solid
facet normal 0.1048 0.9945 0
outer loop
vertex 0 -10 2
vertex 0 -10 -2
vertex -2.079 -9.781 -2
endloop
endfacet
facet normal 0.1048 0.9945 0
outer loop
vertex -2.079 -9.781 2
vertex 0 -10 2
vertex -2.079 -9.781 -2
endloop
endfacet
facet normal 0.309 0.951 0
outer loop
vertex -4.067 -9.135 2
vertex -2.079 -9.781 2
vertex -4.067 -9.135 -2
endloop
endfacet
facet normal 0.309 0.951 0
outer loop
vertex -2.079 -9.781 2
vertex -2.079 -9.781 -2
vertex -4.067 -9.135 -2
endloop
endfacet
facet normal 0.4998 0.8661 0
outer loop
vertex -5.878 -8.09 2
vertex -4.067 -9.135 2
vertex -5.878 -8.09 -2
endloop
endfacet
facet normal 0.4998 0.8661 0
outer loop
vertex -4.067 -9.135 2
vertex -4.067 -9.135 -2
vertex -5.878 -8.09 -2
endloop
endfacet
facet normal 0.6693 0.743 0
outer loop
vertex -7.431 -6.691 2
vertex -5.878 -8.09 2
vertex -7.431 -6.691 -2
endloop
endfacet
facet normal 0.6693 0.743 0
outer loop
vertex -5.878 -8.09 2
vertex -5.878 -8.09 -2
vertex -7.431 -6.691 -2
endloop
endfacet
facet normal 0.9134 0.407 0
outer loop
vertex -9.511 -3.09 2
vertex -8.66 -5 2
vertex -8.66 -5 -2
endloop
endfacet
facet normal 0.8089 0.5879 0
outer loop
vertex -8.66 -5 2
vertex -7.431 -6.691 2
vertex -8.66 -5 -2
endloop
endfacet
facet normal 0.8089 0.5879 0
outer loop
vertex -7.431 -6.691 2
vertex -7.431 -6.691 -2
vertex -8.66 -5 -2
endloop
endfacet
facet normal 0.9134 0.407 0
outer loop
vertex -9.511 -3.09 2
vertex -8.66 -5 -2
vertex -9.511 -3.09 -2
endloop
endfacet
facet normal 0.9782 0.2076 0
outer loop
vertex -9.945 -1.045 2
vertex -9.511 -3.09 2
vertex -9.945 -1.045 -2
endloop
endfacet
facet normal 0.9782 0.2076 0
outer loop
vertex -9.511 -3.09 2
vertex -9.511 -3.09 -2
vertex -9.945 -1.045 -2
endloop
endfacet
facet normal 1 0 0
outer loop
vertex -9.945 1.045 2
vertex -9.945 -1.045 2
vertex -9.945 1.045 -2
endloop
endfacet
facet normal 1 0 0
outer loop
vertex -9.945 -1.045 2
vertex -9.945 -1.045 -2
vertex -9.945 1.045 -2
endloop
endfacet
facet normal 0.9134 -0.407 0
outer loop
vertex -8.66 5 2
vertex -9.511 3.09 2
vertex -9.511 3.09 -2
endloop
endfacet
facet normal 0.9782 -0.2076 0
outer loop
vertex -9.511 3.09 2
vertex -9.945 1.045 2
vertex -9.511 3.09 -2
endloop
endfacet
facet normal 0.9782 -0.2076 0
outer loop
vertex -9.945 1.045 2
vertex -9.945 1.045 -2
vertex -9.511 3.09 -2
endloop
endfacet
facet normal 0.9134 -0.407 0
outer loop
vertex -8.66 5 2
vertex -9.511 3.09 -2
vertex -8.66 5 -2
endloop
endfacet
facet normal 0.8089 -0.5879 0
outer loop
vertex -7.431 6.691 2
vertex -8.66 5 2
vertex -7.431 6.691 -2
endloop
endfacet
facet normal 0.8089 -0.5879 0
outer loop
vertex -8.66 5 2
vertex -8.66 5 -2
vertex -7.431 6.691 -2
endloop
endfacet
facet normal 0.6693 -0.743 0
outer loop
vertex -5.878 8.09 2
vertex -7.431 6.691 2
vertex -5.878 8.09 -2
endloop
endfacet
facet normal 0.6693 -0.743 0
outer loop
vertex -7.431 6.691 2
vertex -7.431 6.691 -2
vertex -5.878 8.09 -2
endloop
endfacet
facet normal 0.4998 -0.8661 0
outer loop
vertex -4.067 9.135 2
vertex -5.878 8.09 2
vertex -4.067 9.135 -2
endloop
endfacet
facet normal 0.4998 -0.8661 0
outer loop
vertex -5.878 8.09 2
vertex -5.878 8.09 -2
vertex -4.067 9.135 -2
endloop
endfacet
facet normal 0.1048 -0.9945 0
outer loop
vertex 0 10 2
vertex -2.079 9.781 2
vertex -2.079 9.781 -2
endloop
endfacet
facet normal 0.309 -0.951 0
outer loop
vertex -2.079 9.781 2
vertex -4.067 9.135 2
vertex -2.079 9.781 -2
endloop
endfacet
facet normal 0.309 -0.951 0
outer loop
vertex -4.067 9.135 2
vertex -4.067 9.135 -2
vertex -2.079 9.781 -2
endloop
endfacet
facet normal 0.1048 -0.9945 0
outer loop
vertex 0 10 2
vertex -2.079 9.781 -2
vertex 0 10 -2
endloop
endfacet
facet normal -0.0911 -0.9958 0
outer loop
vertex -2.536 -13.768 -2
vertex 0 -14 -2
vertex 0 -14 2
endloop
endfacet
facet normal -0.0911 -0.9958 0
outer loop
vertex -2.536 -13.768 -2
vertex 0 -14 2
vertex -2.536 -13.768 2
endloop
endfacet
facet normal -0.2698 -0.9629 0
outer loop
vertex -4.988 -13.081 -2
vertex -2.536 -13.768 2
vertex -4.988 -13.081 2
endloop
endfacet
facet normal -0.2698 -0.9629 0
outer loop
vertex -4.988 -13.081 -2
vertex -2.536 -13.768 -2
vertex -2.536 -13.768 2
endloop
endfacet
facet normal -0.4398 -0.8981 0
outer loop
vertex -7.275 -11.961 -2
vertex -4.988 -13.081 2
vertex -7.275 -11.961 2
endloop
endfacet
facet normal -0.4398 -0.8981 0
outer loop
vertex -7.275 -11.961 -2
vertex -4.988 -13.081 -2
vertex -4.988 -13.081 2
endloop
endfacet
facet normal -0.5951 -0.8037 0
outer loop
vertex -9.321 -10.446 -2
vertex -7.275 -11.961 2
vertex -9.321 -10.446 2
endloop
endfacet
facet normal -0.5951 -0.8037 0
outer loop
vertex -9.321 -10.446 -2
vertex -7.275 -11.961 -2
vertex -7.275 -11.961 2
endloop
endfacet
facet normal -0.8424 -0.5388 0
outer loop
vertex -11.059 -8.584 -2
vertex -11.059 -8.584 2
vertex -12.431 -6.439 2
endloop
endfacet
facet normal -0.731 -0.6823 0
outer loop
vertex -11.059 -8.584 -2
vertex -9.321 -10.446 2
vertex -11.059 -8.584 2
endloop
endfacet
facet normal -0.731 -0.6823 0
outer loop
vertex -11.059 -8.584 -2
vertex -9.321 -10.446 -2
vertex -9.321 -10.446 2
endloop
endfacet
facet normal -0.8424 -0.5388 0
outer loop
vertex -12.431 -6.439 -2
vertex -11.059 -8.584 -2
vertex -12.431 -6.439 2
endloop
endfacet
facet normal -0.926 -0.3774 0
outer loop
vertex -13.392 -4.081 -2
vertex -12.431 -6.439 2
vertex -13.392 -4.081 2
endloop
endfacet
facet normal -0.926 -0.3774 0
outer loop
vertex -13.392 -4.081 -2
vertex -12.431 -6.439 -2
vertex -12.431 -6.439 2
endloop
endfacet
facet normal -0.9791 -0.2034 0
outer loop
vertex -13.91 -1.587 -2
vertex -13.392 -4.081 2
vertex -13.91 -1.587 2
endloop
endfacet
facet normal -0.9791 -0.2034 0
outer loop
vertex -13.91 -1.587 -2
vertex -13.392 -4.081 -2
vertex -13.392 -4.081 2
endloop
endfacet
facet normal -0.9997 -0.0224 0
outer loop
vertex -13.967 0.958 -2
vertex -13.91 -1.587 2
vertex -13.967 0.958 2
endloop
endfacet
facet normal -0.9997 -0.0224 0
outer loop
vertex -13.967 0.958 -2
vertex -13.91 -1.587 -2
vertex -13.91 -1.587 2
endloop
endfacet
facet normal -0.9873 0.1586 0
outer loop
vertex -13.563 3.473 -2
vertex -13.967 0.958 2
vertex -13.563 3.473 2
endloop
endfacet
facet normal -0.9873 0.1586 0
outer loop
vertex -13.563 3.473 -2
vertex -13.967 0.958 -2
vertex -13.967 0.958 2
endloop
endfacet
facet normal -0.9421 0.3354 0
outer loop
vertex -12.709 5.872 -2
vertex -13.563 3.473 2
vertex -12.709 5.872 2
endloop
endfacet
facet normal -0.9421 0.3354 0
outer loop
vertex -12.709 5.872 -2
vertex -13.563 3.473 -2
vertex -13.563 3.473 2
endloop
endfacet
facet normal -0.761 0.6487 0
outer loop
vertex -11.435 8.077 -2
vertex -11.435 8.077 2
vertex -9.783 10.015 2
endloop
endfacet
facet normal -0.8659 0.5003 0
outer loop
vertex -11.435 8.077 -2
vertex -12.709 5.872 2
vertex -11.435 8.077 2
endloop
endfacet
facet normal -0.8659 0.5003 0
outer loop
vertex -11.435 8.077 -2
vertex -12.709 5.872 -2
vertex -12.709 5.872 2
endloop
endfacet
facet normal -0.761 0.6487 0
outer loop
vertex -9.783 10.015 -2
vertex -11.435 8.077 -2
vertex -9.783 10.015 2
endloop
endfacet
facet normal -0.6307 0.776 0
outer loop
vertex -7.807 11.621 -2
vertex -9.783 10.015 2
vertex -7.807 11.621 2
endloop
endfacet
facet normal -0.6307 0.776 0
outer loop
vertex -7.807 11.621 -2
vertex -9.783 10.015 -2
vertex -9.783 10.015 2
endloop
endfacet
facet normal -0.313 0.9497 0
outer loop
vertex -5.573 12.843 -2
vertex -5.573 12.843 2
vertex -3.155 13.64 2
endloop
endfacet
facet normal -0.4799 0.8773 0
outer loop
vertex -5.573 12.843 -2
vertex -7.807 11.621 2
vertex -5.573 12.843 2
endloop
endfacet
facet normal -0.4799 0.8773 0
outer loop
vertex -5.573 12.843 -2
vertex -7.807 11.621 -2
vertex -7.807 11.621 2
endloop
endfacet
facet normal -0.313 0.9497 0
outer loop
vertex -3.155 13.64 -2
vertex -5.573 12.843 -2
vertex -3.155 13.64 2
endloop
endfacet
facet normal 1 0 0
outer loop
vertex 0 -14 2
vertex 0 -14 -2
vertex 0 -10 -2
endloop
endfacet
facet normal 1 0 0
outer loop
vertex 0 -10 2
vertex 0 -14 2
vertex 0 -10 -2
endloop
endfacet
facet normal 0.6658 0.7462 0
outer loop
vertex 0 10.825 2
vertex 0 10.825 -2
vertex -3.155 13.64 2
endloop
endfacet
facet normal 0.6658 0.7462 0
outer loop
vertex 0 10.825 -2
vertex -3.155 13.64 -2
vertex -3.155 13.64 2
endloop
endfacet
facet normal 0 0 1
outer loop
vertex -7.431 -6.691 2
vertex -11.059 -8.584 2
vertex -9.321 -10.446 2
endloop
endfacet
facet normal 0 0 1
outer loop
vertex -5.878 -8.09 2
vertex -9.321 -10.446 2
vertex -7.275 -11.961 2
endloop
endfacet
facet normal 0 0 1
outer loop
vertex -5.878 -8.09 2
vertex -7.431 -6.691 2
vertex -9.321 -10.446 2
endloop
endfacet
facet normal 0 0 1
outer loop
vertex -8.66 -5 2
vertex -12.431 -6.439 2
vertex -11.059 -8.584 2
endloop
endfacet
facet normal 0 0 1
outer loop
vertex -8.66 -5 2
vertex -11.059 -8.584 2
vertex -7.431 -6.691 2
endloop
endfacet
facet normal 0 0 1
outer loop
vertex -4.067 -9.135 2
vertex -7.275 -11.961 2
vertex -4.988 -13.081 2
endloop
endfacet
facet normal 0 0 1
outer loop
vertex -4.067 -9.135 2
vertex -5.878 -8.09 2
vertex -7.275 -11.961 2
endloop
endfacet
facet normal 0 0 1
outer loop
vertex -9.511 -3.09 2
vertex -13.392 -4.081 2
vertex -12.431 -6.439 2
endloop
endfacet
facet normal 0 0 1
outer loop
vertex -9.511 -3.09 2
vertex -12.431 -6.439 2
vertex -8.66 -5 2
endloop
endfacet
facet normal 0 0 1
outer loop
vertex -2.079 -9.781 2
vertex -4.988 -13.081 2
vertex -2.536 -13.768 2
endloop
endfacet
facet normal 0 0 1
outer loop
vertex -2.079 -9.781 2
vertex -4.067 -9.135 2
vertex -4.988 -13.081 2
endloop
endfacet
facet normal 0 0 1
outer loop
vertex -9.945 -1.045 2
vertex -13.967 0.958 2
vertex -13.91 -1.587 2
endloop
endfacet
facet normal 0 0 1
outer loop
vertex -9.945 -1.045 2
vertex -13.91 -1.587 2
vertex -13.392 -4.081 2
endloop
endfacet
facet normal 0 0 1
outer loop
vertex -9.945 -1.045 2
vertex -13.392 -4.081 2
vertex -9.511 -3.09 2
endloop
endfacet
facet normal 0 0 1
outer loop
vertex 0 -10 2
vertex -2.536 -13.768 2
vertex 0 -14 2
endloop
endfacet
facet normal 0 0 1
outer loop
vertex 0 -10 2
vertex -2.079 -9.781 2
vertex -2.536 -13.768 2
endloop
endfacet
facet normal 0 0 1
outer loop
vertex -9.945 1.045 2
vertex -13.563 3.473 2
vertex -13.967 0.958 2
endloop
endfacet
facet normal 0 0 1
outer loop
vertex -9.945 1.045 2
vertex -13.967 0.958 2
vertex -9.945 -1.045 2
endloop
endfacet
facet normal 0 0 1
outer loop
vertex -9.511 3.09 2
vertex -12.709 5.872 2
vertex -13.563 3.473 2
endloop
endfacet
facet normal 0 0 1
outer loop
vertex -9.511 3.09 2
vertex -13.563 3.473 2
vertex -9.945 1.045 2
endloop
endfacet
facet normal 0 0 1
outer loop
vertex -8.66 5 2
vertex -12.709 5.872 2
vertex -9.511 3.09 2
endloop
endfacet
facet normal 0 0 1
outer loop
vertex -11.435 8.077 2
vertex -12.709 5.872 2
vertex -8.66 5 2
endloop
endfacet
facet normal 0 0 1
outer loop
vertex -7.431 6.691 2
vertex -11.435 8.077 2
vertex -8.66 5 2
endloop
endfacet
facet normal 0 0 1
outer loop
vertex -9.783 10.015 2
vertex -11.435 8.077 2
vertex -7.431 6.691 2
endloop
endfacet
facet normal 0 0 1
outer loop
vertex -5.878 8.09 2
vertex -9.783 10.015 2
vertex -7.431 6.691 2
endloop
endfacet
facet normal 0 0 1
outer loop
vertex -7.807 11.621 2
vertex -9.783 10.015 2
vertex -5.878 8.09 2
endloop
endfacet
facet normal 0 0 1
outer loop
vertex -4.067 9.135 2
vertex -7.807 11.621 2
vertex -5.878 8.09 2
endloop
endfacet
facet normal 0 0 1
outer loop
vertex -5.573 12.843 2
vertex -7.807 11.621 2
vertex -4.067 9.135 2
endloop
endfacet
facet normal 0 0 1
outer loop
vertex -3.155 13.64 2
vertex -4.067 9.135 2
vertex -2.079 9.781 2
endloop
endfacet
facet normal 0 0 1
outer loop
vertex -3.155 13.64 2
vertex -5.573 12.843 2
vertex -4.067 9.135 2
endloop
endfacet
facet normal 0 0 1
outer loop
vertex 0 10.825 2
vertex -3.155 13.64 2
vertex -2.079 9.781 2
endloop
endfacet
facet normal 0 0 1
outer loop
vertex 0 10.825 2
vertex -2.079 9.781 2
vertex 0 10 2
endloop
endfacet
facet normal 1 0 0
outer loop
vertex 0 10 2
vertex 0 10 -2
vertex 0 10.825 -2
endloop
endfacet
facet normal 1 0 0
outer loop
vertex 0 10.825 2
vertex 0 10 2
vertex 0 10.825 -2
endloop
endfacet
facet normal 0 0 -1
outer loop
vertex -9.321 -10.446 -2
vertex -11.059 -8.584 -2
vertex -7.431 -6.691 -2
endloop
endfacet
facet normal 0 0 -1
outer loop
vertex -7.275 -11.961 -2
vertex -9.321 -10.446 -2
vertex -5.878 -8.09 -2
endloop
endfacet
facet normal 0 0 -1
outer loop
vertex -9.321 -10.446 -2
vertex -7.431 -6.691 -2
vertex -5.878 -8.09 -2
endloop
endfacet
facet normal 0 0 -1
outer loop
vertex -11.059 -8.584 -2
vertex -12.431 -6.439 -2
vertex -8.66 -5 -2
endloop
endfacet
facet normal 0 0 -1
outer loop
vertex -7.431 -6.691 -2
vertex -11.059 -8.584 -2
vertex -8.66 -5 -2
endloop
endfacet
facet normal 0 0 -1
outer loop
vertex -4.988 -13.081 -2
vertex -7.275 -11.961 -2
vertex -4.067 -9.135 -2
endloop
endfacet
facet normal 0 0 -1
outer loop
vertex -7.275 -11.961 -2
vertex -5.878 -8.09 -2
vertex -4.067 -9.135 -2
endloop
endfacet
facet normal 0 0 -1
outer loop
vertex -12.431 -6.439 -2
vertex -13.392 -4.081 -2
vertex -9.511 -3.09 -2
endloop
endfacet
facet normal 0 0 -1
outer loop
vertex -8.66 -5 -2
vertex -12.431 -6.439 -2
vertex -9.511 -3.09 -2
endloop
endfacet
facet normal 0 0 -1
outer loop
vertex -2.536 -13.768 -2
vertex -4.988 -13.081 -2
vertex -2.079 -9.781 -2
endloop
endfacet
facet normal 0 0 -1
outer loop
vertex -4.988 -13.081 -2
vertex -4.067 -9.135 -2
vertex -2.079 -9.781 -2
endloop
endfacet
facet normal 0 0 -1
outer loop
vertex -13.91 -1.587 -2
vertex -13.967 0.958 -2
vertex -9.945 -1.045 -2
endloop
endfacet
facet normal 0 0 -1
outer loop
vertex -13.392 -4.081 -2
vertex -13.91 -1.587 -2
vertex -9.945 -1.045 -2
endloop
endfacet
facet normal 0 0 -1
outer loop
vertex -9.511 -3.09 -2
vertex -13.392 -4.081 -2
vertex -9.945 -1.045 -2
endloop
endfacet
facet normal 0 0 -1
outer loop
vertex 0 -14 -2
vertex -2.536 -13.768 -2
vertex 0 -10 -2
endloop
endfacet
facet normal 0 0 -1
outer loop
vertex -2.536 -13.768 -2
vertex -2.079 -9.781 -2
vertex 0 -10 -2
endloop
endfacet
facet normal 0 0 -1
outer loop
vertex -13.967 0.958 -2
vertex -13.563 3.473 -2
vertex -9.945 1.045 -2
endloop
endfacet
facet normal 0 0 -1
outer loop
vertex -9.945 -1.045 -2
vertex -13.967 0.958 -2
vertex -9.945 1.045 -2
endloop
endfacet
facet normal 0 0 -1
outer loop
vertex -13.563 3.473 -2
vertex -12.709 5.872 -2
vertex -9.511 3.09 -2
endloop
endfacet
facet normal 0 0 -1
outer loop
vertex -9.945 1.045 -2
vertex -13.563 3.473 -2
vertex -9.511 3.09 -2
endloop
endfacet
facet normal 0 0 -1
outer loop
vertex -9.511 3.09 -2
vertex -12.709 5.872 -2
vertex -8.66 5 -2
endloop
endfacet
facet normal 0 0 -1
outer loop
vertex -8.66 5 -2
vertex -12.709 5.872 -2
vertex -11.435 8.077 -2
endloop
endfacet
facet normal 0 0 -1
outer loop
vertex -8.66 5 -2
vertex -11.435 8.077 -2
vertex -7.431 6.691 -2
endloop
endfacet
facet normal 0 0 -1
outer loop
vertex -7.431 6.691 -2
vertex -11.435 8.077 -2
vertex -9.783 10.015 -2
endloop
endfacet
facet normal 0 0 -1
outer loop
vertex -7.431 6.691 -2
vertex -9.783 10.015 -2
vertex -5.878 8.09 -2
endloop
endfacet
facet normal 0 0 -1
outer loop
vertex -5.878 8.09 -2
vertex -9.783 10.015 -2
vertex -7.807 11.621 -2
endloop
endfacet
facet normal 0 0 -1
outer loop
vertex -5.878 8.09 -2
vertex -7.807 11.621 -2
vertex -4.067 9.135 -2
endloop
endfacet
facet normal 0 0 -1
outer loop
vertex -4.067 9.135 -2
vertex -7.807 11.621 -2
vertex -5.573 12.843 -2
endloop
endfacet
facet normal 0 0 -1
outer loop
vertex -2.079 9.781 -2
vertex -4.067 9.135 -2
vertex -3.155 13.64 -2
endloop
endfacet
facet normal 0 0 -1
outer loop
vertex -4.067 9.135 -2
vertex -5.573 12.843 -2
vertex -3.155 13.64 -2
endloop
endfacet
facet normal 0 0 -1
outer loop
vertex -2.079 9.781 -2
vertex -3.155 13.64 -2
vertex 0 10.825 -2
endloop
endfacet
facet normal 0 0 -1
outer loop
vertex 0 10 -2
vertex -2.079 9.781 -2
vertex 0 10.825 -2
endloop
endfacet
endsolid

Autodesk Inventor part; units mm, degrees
ref_plane "YZ Plane" through (0, 0, 0) normal (1, 0, 0) x (0, 1, 0)
ref_plane "XZ Plane" through (0, 0, 0) normal (0, 1, 0) x (-1, 0, 0)
ref_plane "Work Plane1" through (0, 0, 0) normal (0, 0, 1) x (1, 0, 0)
sketch "Sketch1" plane through (0, 0, 0) normal (0, 0, 1) x (1, 0, 0)
  circle A0 centre (0, 0) radius 14
  circle A1 centre (0, 0) radius 10
  line L0 (0, -14) -> (0, 14)
  point P0 (0, 10)
  point P1 (0, -10)
  dimension "d1" = 4
  dimension "d4" = 20
extrude "Extrusion1" add sketch "Sketch1" along normal mid plane 4 contours L0 A1 A0 picked at (-1.9145, -12.4342)
chamfer "Chamfer1" distance 3.175 angle 45 1 edges at (0, 14, 0)
properties part number "2101b_Tx_Coil_Spacer_short_v1" material "Acetal Resin, White"
